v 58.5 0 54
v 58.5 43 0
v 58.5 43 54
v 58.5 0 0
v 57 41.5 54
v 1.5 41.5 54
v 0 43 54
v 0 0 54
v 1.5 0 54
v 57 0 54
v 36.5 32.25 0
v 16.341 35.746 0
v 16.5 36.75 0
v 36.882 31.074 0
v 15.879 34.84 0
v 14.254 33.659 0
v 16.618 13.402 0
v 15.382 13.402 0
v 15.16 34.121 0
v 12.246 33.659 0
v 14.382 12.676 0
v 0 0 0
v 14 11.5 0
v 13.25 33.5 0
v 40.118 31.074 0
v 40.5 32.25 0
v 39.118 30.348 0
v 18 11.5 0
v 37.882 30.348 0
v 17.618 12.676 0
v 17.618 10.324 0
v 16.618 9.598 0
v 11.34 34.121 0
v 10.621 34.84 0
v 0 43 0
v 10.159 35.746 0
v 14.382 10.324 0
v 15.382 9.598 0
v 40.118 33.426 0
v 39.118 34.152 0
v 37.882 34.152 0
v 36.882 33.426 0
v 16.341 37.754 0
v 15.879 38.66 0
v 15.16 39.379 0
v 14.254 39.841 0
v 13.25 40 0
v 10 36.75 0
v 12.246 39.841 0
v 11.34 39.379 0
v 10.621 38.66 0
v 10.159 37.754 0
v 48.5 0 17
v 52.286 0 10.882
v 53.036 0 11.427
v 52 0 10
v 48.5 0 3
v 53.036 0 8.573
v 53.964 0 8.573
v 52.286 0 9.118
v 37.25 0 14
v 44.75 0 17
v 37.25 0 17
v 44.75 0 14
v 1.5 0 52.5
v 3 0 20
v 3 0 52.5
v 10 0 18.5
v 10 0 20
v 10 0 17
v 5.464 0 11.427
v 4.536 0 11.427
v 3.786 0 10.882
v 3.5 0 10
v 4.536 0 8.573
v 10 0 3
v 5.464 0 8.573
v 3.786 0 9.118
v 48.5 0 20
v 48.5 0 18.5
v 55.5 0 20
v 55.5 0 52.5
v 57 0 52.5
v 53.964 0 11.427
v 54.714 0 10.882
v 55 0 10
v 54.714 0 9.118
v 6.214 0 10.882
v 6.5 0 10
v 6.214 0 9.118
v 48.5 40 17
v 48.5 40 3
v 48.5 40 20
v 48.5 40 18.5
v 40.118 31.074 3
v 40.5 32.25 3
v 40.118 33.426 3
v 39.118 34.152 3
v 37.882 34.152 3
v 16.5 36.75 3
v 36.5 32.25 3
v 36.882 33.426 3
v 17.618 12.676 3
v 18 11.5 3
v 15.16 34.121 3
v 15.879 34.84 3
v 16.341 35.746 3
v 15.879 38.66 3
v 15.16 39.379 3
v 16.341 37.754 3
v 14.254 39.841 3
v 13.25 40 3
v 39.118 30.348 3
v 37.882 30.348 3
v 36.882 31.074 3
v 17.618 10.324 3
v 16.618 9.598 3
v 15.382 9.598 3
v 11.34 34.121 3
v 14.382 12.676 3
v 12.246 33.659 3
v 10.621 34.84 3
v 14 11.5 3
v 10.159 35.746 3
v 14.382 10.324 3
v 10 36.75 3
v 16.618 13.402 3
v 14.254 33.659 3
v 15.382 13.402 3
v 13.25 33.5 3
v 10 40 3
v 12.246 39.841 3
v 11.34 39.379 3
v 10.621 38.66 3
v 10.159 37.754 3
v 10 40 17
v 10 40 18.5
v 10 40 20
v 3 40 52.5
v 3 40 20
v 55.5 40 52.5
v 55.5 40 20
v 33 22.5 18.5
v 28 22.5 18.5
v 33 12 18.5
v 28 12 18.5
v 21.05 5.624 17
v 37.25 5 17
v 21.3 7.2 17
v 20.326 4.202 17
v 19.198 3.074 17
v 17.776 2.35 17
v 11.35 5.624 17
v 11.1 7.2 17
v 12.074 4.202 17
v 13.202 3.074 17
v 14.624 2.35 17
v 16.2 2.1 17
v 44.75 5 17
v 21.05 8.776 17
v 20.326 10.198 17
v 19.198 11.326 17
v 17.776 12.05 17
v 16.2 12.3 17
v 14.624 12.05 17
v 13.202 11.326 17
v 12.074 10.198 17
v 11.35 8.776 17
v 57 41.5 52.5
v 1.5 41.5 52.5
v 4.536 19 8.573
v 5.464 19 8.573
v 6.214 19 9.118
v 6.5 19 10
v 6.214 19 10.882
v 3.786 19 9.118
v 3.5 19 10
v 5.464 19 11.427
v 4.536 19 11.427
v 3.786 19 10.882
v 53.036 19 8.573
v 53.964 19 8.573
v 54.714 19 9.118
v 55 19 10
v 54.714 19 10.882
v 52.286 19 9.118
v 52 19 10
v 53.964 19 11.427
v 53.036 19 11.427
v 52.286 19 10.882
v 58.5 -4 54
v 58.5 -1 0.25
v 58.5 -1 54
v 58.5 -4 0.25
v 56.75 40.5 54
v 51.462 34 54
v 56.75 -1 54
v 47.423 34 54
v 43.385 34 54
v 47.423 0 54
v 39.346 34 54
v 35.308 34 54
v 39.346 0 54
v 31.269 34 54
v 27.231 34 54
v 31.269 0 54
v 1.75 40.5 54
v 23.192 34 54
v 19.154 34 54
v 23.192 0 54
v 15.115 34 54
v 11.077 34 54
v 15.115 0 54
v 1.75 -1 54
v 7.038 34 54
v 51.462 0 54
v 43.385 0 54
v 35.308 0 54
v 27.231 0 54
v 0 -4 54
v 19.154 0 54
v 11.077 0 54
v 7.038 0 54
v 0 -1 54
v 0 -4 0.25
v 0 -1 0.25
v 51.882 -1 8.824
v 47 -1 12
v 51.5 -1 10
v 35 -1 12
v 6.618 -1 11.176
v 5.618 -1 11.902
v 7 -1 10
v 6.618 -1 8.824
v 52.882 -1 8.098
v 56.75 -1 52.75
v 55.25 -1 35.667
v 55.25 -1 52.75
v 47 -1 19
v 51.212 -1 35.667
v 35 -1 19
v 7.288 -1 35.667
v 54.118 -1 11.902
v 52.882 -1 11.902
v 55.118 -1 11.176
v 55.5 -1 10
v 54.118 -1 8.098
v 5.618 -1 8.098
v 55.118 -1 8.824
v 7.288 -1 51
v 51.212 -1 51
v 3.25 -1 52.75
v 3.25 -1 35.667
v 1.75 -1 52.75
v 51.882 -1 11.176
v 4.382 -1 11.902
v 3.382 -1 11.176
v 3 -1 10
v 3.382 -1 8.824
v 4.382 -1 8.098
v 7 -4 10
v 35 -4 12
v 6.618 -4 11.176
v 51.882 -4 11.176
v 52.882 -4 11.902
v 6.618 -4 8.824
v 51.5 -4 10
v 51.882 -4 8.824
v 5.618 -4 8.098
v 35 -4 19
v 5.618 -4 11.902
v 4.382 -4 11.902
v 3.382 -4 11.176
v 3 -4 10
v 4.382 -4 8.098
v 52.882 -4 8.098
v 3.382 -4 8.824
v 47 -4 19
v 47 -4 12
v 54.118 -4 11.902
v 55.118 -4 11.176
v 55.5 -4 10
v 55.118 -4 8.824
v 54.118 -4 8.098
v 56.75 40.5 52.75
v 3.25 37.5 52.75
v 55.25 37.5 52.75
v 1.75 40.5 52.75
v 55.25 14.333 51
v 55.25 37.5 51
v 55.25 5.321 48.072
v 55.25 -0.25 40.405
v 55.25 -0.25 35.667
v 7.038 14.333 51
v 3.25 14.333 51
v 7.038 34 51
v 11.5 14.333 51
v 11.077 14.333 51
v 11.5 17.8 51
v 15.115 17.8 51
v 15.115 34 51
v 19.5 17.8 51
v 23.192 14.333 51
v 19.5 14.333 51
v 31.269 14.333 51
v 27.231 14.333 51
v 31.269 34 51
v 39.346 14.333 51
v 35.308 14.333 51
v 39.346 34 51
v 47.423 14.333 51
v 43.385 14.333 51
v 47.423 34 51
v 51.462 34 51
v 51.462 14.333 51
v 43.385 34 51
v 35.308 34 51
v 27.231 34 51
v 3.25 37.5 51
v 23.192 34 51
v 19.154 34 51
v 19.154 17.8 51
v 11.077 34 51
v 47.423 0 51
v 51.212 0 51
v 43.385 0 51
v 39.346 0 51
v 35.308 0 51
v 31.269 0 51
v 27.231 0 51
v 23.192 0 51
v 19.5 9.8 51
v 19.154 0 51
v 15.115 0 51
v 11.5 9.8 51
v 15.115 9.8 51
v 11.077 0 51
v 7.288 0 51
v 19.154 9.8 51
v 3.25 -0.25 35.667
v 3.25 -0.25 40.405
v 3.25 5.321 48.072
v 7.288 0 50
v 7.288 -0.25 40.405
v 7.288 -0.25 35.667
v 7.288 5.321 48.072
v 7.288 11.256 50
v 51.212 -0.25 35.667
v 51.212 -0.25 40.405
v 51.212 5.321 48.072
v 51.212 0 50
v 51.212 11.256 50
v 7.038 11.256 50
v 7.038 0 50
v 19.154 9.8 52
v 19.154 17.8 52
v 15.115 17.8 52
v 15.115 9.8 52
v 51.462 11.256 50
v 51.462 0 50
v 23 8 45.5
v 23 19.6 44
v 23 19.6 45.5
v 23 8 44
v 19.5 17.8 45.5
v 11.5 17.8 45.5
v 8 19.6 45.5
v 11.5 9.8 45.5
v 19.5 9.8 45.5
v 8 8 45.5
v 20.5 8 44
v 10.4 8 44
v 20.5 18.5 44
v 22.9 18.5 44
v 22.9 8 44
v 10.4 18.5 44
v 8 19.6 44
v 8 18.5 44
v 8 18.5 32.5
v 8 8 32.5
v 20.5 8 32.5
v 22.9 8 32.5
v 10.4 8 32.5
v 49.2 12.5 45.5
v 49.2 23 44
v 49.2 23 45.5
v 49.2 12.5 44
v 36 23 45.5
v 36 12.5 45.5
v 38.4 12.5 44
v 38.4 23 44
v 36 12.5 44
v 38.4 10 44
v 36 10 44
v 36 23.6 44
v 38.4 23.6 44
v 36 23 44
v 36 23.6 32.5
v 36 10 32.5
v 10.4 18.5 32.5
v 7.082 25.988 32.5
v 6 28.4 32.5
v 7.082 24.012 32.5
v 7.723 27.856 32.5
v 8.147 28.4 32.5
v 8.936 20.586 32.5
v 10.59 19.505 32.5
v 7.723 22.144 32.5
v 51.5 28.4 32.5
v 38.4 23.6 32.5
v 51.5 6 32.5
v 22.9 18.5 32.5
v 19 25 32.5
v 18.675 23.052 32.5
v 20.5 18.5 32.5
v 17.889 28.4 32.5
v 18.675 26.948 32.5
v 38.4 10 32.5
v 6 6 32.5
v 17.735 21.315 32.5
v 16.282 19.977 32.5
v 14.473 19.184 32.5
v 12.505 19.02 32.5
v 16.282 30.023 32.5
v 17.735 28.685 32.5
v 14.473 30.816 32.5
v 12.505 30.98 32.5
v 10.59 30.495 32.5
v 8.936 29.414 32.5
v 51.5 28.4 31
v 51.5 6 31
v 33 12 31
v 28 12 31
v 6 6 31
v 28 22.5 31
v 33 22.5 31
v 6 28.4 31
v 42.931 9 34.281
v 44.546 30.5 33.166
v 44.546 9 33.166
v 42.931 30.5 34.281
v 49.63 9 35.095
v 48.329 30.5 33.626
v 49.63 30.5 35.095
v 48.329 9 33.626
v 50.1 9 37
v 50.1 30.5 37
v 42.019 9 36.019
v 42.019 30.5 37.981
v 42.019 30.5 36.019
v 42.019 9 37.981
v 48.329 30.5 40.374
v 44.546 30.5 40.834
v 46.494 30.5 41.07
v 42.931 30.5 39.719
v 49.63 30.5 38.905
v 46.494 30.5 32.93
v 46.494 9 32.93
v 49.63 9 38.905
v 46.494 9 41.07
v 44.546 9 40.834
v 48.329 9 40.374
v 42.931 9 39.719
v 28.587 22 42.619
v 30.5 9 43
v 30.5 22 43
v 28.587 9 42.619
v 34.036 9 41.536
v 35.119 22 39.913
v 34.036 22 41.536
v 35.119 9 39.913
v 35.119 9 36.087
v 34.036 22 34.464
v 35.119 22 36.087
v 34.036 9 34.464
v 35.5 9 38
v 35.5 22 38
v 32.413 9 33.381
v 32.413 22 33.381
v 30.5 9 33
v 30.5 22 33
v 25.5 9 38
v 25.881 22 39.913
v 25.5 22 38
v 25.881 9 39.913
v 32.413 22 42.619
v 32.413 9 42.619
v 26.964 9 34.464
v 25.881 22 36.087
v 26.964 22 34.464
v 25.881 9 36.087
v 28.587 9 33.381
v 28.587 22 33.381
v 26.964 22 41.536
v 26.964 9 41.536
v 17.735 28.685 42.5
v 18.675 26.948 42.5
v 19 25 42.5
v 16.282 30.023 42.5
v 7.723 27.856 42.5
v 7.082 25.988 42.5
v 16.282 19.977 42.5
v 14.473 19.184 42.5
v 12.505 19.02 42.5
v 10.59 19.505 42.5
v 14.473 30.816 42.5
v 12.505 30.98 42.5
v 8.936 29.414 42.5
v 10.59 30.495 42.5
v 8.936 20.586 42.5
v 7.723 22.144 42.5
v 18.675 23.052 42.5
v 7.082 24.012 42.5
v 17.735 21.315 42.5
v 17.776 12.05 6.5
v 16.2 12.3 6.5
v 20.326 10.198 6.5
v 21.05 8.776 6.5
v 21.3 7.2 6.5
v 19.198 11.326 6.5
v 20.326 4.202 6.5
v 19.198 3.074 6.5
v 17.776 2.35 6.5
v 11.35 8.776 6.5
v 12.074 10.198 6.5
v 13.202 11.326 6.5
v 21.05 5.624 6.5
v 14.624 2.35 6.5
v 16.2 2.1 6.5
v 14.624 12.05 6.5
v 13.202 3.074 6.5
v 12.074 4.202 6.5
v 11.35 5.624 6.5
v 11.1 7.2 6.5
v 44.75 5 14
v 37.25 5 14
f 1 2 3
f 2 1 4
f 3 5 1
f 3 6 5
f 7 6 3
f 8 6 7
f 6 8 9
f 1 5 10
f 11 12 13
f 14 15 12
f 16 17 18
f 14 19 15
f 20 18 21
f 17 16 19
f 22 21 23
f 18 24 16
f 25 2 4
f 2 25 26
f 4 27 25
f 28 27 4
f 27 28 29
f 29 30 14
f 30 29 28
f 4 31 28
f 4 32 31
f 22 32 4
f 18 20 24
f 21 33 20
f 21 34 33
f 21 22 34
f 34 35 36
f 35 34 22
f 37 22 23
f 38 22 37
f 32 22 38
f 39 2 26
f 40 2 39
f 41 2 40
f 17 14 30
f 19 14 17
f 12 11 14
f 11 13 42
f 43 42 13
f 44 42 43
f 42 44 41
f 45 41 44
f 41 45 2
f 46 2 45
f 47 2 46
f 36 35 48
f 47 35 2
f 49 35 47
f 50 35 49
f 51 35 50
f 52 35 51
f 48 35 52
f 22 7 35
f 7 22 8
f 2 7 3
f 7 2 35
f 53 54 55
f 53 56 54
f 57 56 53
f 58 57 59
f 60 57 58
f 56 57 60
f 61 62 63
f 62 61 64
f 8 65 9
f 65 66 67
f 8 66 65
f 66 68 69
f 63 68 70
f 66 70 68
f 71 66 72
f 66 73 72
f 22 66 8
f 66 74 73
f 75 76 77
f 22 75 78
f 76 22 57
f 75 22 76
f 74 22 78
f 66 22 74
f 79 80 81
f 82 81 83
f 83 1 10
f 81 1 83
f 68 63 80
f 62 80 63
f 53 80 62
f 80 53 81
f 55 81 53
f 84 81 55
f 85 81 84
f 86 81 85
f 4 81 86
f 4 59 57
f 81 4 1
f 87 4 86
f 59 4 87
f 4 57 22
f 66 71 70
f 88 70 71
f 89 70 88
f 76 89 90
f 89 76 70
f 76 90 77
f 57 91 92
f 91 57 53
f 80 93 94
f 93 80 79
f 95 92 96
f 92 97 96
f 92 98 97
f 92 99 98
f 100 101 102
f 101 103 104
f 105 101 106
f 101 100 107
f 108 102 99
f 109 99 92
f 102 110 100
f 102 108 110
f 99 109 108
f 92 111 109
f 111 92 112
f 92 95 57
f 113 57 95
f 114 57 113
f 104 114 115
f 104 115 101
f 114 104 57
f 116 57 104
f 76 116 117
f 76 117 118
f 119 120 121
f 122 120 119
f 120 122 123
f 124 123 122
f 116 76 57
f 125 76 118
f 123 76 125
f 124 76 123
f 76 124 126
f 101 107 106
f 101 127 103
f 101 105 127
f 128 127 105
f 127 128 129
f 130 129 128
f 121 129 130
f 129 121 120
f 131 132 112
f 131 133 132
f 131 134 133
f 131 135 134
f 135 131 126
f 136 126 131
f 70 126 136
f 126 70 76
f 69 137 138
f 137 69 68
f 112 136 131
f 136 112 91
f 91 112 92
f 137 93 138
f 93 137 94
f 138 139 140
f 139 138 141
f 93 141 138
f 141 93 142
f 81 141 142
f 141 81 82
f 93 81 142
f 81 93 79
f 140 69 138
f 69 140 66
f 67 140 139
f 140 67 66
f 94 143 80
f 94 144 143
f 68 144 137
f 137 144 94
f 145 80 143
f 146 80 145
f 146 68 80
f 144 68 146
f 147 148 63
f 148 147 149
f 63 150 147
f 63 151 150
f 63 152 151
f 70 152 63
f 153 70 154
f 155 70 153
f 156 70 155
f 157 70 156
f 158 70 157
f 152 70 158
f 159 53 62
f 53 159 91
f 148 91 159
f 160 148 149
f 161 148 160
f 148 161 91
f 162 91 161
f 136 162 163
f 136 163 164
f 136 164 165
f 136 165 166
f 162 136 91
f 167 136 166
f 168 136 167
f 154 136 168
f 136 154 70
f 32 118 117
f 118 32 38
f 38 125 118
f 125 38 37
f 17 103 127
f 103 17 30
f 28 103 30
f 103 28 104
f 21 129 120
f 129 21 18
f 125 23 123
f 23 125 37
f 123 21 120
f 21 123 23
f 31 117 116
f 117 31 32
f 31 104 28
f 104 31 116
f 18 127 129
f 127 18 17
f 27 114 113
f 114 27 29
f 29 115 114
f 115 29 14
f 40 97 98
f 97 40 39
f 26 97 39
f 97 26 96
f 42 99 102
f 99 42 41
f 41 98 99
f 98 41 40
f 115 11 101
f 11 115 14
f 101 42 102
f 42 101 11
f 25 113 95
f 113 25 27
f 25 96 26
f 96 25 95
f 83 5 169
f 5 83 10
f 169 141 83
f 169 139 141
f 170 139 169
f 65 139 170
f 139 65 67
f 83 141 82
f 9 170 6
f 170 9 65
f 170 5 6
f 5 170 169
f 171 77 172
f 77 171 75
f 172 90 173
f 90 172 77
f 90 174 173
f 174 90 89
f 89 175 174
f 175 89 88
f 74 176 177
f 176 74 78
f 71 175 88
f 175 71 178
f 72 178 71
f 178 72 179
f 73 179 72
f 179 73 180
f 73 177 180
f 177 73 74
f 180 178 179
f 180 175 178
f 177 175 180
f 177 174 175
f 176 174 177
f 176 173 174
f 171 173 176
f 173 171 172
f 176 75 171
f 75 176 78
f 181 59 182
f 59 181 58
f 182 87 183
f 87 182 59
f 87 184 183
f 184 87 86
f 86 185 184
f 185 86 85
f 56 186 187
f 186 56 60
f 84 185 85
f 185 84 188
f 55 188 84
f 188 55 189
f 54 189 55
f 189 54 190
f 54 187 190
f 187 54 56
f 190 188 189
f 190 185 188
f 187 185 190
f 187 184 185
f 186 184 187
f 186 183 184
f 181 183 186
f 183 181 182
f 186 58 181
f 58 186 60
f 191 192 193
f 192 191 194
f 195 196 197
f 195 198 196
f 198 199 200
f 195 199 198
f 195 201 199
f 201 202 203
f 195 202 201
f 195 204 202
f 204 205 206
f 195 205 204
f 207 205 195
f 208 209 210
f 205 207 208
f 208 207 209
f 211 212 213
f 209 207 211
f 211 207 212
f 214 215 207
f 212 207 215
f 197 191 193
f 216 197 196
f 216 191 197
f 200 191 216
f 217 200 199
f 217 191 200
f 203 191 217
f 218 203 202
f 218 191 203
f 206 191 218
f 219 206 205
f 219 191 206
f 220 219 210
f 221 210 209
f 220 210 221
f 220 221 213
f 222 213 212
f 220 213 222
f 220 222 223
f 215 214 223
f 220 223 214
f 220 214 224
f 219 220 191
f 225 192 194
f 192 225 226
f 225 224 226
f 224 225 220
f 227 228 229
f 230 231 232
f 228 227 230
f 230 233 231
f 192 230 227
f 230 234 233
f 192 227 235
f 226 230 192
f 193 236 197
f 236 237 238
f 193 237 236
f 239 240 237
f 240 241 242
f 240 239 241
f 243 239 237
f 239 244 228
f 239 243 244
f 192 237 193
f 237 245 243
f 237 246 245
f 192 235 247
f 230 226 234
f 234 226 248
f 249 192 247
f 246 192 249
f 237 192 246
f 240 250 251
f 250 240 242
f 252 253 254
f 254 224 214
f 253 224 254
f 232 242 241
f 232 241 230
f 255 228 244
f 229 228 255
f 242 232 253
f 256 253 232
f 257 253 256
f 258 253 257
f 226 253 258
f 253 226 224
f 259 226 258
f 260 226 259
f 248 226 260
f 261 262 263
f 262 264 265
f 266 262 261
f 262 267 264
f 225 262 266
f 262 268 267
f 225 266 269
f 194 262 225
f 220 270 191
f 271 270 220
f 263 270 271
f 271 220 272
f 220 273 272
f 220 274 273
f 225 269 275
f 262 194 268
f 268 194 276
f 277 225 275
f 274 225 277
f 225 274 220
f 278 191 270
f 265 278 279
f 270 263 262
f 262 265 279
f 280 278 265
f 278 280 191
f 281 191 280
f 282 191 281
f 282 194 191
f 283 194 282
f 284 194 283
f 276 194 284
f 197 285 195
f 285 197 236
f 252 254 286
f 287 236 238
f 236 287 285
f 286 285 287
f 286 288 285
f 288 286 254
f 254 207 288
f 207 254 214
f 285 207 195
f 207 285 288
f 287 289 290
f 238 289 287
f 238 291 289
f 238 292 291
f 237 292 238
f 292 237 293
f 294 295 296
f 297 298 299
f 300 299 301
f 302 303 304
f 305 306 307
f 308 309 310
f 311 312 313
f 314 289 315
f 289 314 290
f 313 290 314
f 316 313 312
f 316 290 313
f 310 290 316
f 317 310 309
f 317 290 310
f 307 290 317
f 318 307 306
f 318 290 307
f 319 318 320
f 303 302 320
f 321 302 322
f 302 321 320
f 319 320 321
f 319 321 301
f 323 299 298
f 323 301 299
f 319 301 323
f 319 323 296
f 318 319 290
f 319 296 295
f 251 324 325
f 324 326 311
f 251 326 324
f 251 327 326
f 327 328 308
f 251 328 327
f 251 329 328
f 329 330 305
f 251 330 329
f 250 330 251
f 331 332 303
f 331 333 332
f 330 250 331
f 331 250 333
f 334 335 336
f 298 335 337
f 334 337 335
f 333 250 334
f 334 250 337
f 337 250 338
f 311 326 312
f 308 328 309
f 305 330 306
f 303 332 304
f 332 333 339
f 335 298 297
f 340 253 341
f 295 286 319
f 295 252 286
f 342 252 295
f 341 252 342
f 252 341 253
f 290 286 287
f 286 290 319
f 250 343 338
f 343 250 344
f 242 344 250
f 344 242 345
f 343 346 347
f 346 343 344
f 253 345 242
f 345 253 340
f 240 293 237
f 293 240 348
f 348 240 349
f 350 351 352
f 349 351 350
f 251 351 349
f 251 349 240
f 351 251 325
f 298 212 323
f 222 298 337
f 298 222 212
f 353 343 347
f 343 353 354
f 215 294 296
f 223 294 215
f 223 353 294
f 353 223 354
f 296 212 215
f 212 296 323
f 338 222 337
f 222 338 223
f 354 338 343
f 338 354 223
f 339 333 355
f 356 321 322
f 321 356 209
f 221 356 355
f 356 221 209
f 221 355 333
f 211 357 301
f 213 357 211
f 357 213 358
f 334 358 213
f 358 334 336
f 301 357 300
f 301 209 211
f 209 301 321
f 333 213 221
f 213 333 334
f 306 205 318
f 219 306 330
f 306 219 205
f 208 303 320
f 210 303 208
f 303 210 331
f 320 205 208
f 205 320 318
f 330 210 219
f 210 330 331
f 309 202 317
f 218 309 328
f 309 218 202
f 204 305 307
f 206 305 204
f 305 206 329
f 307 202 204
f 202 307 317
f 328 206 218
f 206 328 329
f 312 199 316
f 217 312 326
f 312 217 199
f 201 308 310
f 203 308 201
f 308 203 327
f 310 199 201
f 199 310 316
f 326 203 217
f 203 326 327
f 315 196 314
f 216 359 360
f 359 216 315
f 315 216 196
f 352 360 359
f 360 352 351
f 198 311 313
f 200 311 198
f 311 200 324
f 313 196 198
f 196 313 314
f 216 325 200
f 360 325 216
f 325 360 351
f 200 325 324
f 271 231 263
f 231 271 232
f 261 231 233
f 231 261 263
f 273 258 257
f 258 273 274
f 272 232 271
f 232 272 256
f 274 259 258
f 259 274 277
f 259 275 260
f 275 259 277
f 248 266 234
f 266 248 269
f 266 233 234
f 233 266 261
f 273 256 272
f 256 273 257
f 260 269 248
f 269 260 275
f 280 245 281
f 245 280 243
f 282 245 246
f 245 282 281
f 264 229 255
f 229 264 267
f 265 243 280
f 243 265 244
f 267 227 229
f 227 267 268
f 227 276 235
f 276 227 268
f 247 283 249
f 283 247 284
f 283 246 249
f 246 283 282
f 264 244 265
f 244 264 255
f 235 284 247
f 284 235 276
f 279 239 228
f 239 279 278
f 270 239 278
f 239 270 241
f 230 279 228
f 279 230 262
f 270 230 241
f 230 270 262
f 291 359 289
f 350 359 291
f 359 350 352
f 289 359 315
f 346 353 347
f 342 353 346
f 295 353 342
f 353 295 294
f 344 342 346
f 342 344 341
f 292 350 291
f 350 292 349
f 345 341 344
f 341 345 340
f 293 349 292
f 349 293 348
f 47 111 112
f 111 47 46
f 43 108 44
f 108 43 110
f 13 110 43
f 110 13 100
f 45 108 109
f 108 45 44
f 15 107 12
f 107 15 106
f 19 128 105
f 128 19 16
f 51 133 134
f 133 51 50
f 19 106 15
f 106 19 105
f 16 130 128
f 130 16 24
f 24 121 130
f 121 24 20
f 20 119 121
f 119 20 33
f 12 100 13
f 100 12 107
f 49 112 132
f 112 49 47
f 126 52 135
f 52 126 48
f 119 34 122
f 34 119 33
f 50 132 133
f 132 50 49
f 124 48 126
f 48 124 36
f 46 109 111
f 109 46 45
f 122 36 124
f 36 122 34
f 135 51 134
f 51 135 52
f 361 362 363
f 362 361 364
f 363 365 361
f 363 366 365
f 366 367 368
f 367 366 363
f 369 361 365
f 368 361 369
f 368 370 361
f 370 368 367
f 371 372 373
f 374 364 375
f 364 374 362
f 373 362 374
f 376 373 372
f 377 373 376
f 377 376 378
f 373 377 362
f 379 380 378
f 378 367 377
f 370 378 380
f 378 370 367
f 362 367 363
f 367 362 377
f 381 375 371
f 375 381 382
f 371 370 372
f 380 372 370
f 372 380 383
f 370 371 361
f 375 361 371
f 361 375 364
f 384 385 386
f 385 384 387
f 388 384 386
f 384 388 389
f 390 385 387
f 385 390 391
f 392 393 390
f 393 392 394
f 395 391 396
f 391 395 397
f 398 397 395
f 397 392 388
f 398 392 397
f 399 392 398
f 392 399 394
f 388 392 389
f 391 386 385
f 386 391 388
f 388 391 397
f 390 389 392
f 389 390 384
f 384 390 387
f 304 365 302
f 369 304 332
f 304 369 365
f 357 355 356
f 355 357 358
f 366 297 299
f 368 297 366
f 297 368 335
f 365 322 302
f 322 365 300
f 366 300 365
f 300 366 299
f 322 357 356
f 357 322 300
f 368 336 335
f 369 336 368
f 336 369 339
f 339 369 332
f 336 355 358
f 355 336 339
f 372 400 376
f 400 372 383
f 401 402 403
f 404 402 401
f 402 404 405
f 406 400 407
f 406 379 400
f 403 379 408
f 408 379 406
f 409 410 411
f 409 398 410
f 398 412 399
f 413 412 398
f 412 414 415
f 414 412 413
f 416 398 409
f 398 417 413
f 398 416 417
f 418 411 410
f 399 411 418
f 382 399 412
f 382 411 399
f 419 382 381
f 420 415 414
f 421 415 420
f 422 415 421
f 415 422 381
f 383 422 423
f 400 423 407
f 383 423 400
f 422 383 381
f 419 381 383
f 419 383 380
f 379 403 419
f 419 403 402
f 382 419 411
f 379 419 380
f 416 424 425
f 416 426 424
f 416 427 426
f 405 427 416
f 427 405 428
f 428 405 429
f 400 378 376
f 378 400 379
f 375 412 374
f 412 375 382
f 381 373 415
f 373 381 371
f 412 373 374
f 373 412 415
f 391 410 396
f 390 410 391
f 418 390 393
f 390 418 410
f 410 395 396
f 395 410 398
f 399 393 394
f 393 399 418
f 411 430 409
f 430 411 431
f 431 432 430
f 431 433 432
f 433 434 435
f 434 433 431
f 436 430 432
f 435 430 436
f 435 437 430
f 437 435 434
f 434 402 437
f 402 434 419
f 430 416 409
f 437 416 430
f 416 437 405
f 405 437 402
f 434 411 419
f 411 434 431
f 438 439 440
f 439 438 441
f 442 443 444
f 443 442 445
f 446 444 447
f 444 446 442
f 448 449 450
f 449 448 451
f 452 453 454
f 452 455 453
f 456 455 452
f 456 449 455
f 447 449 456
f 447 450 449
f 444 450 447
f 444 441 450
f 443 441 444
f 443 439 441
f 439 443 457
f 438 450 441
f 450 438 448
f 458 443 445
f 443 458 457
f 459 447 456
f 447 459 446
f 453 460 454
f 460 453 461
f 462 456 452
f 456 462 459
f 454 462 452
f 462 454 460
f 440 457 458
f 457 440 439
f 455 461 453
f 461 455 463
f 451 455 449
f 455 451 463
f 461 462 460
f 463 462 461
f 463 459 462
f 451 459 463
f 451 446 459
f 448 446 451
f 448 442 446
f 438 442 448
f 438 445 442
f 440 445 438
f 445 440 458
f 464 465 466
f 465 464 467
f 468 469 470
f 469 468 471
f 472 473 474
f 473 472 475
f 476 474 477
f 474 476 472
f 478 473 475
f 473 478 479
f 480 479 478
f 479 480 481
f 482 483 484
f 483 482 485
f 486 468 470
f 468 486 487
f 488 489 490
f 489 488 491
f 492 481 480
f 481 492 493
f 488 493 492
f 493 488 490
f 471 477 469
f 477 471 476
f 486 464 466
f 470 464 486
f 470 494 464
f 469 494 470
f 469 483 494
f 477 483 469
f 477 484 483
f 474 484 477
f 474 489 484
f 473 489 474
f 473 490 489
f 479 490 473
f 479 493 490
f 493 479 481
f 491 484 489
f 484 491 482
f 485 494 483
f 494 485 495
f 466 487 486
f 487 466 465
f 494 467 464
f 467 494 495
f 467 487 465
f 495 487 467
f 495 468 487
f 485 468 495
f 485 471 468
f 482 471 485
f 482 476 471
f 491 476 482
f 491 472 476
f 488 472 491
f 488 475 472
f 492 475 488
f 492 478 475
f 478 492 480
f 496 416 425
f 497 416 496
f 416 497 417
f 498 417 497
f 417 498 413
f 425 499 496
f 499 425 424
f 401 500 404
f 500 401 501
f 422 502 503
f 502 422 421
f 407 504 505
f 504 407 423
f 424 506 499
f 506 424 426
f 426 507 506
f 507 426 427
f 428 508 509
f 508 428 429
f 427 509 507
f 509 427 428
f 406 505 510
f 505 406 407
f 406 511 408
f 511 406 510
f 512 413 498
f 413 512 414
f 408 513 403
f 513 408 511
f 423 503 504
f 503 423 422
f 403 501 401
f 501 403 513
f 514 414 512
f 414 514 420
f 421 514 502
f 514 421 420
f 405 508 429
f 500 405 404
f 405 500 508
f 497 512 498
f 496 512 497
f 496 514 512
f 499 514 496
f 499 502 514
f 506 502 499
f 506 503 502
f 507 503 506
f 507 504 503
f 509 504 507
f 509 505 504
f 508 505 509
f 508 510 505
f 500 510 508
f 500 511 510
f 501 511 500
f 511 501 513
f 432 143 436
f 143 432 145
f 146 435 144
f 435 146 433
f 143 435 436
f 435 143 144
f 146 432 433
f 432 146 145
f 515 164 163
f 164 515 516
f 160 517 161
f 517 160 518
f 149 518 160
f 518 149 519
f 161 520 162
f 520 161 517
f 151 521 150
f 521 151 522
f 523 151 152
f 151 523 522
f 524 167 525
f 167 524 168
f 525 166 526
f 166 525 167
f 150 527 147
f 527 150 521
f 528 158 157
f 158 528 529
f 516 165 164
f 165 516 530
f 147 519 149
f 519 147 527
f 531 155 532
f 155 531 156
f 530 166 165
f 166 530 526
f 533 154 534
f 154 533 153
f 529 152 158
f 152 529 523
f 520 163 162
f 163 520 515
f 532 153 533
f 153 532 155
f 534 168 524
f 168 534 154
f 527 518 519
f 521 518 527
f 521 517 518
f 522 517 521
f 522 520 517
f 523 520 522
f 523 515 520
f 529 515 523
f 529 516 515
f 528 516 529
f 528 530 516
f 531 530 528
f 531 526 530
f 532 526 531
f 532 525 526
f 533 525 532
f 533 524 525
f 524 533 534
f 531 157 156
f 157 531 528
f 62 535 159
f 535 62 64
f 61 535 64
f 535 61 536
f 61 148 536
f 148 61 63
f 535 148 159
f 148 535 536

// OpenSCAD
/* [Basics] */

// Welcher Teil soll ausgegeben werden
Ausgabe="beides"; //[beides,nur Deckel,nur Sockel]

// Platine anzeigen (bitte nicht mitdrucken)
Platine_anzeigen="ja"; // [ja,nein]

// mm Spiel zwischen Unterteil und Oberteil
Spiel=0.25; //[0:0.05:3]

//Zusaetzlicher Raum unter der Platine in mm
Raum_Unten=0; // [0:1:20]

//Raum oberhalb der Steckerleiste auf der Hauptplatine in mm (nur Zwischenplatine: 18mm, mit BME280: 21mm, mit SCD41: 26mm
Raum_Oben=26; // [0:0.5:100]

//Raum seitlich von der Zwischenplatine
Raum_Daneben=2; // [0:0.5:50]

/* [Wandbefestigung] */
// Durchmesser der Wandbefestigungsloecher in mm
Wandbefestigungsloch=4; // [0:0.1:10]




/* [USB-Stecker] */
// Soll ein Loch fuer den USB-Stecker gelassen werden?
Stecker="ja"; //[ja,nein]
USB_Steckerbreite=12; // [0:0.1:20]
USB_Steckerhoehe=7;   // [0:0.1:20]

/* [KNX-Kabel] */
// Loch fuer Kabel oder KNX-Stecker
Kabeltyp="Kabel"; // [Kabel,Stecker]


// Position
Kabelposition="Boden hinten"; //[keins,Rueckseite,Boden vorne,Boden hinten,Links,Rechts,Vorderseite]

// Ausrichtung
Kabelausrichtung="Links"; //[Links,Rechts,Mitte]

// Durchmesser des Kabelloches in mm
Kabeldicke=6.5; // [0:0.1:20]

// Abmessungen KNX-Stecker
KNX_Stecker_Breite=13; // [0:0.1:20]
KNX_Stecker_Hoehe=11;  // [0:0.1:20]

/* [Deckelverschraubung] */
// Durchmesser des Loches der Deckelverschraubung im festen Teil
Bohrloch=3; // [0:0.1:10]

// Durchmesser des Loches im Deckel
Deckelloch=4; // [0:0.1:10]

/* [Lueftungsschlitze] */
Anzahl_Schlitze=6; // [0:1:20]


/* [Hidden] */

PlatineBreite=40.5;
PlatineTiefe=40;
PlatineHoehe=1.5;

wandstaerke=3;
gesamtHoehe=28+Raum_Unten+Raum_Oben;

rilleHoehe=PlatineHoehe;
rilleTiefe=1;

AusschnittHoeheOben=4;
AusschnittHoeheUnten=5;

untereHoehe = 14+Raum_Unten;
ueberhang = Raum_Daneben + rilleTiefe +4;

gesamtTiefe=PlatineTiefe+2*wandstaerke;
gesamtBreite = 2*(wandstaerke+ueberhang-rilleTiefe) + PlatineBreite;


USB_Rechts=wandstaerke+ueberhang-rilleTiefe+32;
USB_Oben=wandstaerke+untereHoehe-PlatineHoehe;


difference(){
    union(){
    if (Ausgabe == "nur Deckel") {
		Deckel();
	} else if (Ausgabe == "nur Sockel") {
		Sockel();
	} else {
		Sockel();
        Deckel();
	}}

    Kabelauslass();
}

if(Platine_anzeigen=="ja") Platine();
    

module Platine()
{
        translate([wandstaerke+ueberhang-rilleTiefe,0,untereHoehe+wandstaerke])
    {
        color("green")
            cube([PlatineBreite,PlatineTiefe,PlatineHoehe]);
        color("grey")
            translate([7.2,7.2,-10.5])
            cylinder(10.5 , d=10.2, center=false,$fn=20);
        color("grey")
            translate([32-7.5/2,0,-3])
            cube([7.5,5,3]);
        
        translate([19,12,PlatineHoehe]){
            color("black")
            cube([5,10.5,12.5]);
            translate([-22,-6,12.5]){
                color("green")
                cube([45.5,22.4,PlatineHoehe]);
               
                
                color("black")
                translate([40,3,6])
                rotate([-90,0,0])
                cylinder(21.5,d=8.2,center=false);
                
                color("black")
                translate([24.5,3,7])
                rotate([-90,0,0])
                cylinder(13,d=10,center=false);

                color("black")
                translate([7,19,PlatineHoehe])
                cylinder(10,d=12,center=false);

                
                translate([2,2,PlatineHoehe])
                {
                    color("black")
                    cube([2.4,10.5,11.5]);

                    translate([12.5,0,0])
                    color("black")
                    cube([2.4,10.5,11.5]);
                    
                    translate([28,2,0])
                    color("black")
                    cube([2.4,13.6,11.5]);
                    
                    translate([0,0,11.5]){
                    color("green")
                    cube([15,11.6,PlatineHoehe]);
                    
                    translate([28,4.5,0])
                    color("green")
                    cube([13.2,10.5,PlatineHoehe]);
    
                    translate([3.5,1.8,PlatineHoehe]) 
                    color("gray")
                    cube([8,8,6.5]);
                        
                    }
                }
                
                }
                
            
            
        }
}}

module Kabelauslass() {
    Kabeldrehung=(Kabelposition=="Rueckseite" || Kabelposition=="Vorderseite" ) ? [90,0,0] : (Kabelposition=="Rechts" || Kabelposition=="Links" )? [90,0,90] : [0,0,0];    
        

    if (Kabelposition=="Rueckseite"){
        translate([(Kabelausrichtung=="Links")? wandstaerke+ueberhang+Kabeldicke/2:(Kabelausrichtung=="Rechts")?gesamtBreite-wandstaerke-ueberhang-Kabeldicke/2:gesamtBreite/2,gesamtTiefe-wandstaerke+1,0])
        rotate([90,0,0])
        Kabel();
    }
    
    if (Kabelposition=="Vorderseite"){
        translate([(Kabelausrichtung=="Links")? wandstaerke+ueberhang+Kabeldicke/2:(Kabelausrichtung=="Rechts")?gesamtBreite-wandstaerke-ueberhang-Kabeldicke/2:gesamtBreite/2,0,0])
        rotate([90,0,0])
        Kabel();
    }
    
    if (Kabelposition=="Rechts"){
        translate([gesamtBreite-wandstaerke-ueberhang-1,(Kabelausrichtung=="Links")? wandstaerke+Kabeldicke/2:(Kabelausrichtung=="Rechts")?gesamtTiefe-2*wandstaerke-Kabeldicke/2:(gesamtTiefe-wandstaerke)/2,0])
        rotate([90,0,90])
        Kabel();
    }
    
    if (Kabelposition=="Links"){
        translate([-1,(Kabelausrichtung=="Links")? wandstaerke+Kabeldicke/2:(Kabelausrichtung=="Rechts")?gesamtTiefe-2*wandstaerke-Kabeldicke/2:(gesamtTiefe-wandstaerke)/2,0])
        rotate([90,0,90])
        Kabel();
    }
    
    if (Kabelposition=="Boden vorne"){
        translate([(Kabelausrichtung=="Links")? wandstaerke+ueberhang+Kabeldicke/2:(Kabelausrichtung=="Rechts")?gesamtBreite-wandstaerke-ueberhang-Kabeldicke/2:gesamtBreite/2,0,-1])
        Kabel();
    }
    
    if (Kabelposition=="Boden hinten"){
        translate([(Kabelausrichtung=="Links")? wandstaerke+ueberhang+Kabeldicke/2:(Kabelausrichtung=="Rechts")?gesamtBreite-wandstaerke-ueberhang-Kabeldicke/2:gesamtBreite/2,gesamtTiefe-3*wandstaerke-((Kabeltyp=="Stecker")?KNX_Stecker_Hoehe:Kabeldicke),-1])
        Kabel();
    }
} 

module Kabel() {
    
    if (Kabeltyp=="Stecker")
    {
        translate([-KNX_Stecker_Breite/2,wandstaerke,0])    
        cube([KNX_Stecker_Breite,KNX_Stecker_Hoehe,ueberhang+wandstaerke+2]);
    }
        
    else {
        translate([0,Kabeldicke/2+wandstaerke,0])
        cylinder( ueberhang+wandstaerke+2 , d=Kabeldicke, center=false,$fn=20);
        if (Kabelposition=="Vorderseite"){
            translate([-Kabeldicke/2,0,0])
            cube([Kabeldicke,Kabeldicke/2+wandstaerke,wandstaerke+2]);   
        }
    }
}

////// Teil 1
module Sockel() {
difference(){
cube([gesamtBreite,gesamtTiefe-wandstaerke,gesamtHoehe]);
    // unterer Kasten
translate([ueberhang+wandstaerke,-1,wandstaerke]) 
    cube([gesamtBreite-2*(wandstaerke+ueberhang),gesamtTiefe-2*wandstaerke+1,gesamtHoehe-wandstaerke+1]);
    
    // oberer Kasten
    translate([wandstaerke,-1,wandstaerke+untereHoehe+2*PlatineHoehe]) 
        cube([gesamtBreite-2*wandstaerke,gesamtTiefe-2*wandstaerke+1,gesamtHoehe-wandstaerke-untereHoehe-2*PlatineHoehe+1]);
    
    
    
    // Ausschnitt Platine
translate([wandstaerke+ueberhang-rilleTiefe,-1,untereHoehe+wandstaerke]) 
    cube([PlatineBreite,gesamtTiefe-2*wandstaerke+1,PlatineHoehe]);

   
    // Wand-Befestigungsloecher
    translate([3*wandstaerke+ueberhang,gesamtTiefe/4,-1])
    cylinder( wandstaerke+2 , d=Wandbefestigungsloch, center=false,$fn=10);

    translate([gesamtBreite-(wandstaerke+ueberhang+2.5*Wandbefestigungsloch),(gesamtTiefe-wandstaerke)*3/4,-1])
    cylinder( wandstaerke+2 , d=Wandbefestigungsloch, center=false,$fn=10);

    // Deckel
    
    translate([wandstaerke/2,-wandstaerke/2,gesamtHoehe-wandstaerke/2])
    cube([gesamtBreite-wandstaerke,gesamtTiefe-wandstaerke,wandstaerke/2+1]);
    
    // Deckelloch
    translate([(wandstaerke+ueberhang)/2,-1,wandstaerke+untereHoehe/2])
    rotate([-90,0,0])
    cylinder( 20 , d=Bohrloch, center=false,$fn=10);
    
    translate([(gesamtBreite-(wandstaerke+ueberhang)/2),-1,wandstaerke+untereHoehe/2])
    rotate([-90,0,0])
    cylinder( 20 , d=Bohrloch, center=false,$fn=10);
    
}
}


module Deckel () {

// Lueftungsschlitze
Schlitzbreite = (gesamtBreite-2*wandstaerke)/(2*Anzahl_Schlitze+1);

// Deckel
translate([0,-1,0])
difference(){
union(){
translate([0,-wandstaerke,Spiel])
cube([gesamtBreite,wandstaerke,gesamtHoehe-Spiel]);


    translate([wandstaerke/2+Spiel,-wandstaerke/2,gesamtHoehe-wandstaerke/2+Spiel])
    cube([gesamtBreite-wandstaerke-2*Spiel,gesamtTiefe-wandstaerke,wandstaerke/2-Spiel]);

    translate([wandstaerke+Spiel,-wandstaerke/2,gesamtHoehe-wandstaerke])
    cube([gesamtBreite-2*wandstaerke-2*Spiel,gesamtTiefe-2*wandstaerke,wandstaerke/2+Spiel]);
    
    translate([wandstaerke+Spiel,0,gesamtHoehe-wandstaerke-gesamtTiefe/3])
    cube([Schlitzbreite,gesamtTiefe/3,gesamtTiefe/3]);
    
    translate([gesamtBreite-(wandstaerke+Spiel+Schlitzbreite),0,gesamtHoehe-wandstaerke-gesamtTiefe/3])
    cube([Schlitzbreite,gesamtTiefe/3,gesamtTiefe/3]);
}


// Bohrloecher
translate([(wandstaerke+ueberhang)/2,1,wandstaerke+untereHoehe/2])
    rotate([90,0,0])
    cylinder( 20 , d=Deckelloch, center=false,$fn=10);
    
    translate([(gesamtBreite-(wandstaerke+ueberhang)/2),1,wandstaerke+untereHoehe/2])
    rotate([90,0,0])
    cylinder( 20 , d=Deckelloch, center=false,$fn=10);


// Stecker
    translate([USB_Rechts-USB_Steckerbreite/2,wandstaerke*-1-1,USB_Oben-USB_Steckerhoehe/2])
    cube([USB_Steckerbreite,wandstaerke+2,USB_Steckerhoehe]);


// Schlitze
for (n =[0:Anzahl_Schlitze-1])
{
    translate([wandstaerke+(n*2+1)*Schlitzbreite,1,gesamtHoehe-wandstaerke-1])
    cube([Schlitzbreite,gesamtTiefe-4*wandstaerke,wandstaerke+2]);}


// Abrundung
translate([-1,gesamtTiefe/3,gesamtHoehe-wandstaerke-gesamtTiefe/3])
rotate([0,90,0])
cylinder(gesamtBreite+2, r=gesamtTiefe/3,$fn=10);
}}
